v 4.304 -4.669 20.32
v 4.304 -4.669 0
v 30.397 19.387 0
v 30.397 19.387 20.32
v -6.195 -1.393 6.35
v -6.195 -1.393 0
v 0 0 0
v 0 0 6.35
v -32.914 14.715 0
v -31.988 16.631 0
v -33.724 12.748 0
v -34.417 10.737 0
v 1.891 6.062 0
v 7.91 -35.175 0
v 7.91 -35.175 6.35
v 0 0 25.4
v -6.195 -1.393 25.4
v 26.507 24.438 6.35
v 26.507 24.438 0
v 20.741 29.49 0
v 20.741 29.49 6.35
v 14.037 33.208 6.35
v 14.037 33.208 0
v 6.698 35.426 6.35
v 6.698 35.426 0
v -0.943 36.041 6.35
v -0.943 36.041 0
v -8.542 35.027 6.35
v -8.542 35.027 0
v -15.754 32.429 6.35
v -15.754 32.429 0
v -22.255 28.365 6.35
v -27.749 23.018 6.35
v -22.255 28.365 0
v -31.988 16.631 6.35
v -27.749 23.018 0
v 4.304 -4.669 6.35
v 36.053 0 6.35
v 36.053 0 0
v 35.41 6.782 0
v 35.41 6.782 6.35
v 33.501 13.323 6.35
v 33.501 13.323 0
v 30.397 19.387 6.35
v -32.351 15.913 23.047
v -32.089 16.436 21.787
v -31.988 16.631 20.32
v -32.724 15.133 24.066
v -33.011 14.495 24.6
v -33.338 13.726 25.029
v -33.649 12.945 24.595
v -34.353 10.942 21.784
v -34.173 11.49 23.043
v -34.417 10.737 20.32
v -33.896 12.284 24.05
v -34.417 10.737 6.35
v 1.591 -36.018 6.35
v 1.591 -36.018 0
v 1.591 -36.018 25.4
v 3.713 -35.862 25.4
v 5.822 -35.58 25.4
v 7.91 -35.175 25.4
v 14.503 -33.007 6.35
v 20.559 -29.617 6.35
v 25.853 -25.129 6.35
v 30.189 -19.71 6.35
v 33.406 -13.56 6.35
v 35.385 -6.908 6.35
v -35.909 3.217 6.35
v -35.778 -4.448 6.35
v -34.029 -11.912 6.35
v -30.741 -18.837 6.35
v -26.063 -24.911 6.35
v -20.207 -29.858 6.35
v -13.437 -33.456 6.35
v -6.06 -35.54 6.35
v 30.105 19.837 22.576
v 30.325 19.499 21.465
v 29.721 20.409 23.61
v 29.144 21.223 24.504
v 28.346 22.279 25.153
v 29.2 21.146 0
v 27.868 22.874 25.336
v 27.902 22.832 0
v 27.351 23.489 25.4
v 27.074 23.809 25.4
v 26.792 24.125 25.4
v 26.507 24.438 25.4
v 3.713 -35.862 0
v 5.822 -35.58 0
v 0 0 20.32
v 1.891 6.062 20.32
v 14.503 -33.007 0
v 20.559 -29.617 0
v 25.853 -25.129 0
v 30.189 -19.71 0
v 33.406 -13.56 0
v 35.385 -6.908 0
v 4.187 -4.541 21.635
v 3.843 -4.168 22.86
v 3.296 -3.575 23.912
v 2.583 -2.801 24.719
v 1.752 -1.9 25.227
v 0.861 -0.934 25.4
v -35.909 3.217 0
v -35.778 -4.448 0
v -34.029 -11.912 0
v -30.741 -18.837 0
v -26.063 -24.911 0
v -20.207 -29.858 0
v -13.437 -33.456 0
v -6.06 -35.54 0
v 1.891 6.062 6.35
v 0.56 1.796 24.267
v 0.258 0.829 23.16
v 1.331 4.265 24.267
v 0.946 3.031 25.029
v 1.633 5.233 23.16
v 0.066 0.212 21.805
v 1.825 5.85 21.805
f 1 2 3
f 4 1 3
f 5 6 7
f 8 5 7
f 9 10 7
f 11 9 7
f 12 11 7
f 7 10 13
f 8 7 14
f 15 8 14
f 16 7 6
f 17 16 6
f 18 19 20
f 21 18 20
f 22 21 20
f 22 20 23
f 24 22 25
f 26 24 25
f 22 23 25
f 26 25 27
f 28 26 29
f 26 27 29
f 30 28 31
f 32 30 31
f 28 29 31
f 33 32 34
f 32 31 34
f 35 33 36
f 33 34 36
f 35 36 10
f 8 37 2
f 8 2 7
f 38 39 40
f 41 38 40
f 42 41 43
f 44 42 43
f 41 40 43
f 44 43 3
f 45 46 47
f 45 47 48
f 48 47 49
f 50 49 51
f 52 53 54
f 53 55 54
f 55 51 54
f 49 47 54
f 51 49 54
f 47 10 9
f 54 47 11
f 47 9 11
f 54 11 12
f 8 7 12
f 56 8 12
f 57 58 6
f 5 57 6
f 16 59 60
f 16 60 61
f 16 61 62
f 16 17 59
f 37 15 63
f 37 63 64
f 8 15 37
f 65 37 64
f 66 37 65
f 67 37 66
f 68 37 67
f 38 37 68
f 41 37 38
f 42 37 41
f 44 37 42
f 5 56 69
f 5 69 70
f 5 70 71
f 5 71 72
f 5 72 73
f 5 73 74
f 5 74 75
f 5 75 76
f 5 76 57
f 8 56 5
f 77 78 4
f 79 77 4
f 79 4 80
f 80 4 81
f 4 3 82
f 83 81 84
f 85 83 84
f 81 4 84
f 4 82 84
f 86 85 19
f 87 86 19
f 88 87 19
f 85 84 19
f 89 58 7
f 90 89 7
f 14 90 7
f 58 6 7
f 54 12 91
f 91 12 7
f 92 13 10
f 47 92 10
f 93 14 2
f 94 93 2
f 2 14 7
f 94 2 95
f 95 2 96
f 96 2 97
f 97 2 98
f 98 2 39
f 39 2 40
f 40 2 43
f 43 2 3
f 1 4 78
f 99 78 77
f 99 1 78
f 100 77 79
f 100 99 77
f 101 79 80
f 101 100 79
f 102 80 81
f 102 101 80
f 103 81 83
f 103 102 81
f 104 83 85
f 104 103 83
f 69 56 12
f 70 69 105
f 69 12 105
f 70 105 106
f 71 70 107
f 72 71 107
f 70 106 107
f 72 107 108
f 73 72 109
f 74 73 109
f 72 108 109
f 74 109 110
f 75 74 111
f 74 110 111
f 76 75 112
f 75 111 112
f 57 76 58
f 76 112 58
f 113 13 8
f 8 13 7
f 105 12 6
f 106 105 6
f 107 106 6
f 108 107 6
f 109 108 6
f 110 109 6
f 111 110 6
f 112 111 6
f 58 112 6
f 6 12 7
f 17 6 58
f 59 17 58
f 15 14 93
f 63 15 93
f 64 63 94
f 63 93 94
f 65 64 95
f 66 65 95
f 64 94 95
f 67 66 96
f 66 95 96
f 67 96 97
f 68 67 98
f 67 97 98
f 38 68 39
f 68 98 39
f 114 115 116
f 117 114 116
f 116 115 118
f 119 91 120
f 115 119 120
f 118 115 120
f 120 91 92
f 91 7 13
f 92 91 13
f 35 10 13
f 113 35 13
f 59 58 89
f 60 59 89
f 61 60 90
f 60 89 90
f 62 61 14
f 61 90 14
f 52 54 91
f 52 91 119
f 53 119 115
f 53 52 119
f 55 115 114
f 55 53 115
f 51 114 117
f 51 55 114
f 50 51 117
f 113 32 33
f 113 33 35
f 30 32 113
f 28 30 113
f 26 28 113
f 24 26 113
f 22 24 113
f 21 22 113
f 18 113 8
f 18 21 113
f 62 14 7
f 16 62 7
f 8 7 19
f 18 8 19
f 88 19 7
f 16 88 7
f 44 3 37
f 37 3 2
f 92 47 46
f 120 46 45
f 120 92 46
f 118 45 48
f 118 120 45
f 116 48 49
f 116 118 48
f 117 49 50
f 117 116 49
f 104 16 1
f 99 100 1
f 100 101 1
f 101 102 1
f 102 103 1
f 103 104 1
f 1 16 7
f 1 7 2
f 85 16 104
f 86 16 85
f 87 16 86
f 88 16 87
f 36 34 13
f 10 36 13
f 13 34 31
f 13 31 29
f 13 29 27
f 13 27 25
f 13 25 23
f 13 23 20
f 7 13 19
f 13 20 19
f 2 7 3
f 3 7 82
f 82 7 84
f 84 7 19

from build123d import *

# Parameters (mm, degrees)
F1_DEPTH      = 25.4
F2_DEPTH      = 6.35
F3_T1_DEPTH   = 61.4532364119
F3_T3_DEPTH   = 60.8896232126
F3_2_T1_DEPTH = 60.8896232126


# Not quite as in the source:
# - a fillet or chamfer that OpenCascade refuses, or shapes differently, is made with other operations: its cross-section is extruded or revolved along the edge and cut away or added


with BuildPart() as f1:
    # F0 (on Top) → F1 (new body)
    with BuildSketch(Plane.XY):
        with BuildLine():
            Line((-34.4173737851, 10.7368634857), (0, 0))
            Line((0, 0), (1.891066931, 6.0618780805))
            Line((1.891066931, 6.0618780805), (-31.9882667756, 16.6308942775))
            ThreePointArc((-31.9882667756, 16.6308942775), (-33.3333492813, 13.737673801), (-34.4173737851, 10.7368634857))
        make_face()
    extrude(amount=F1_DEPTH)

    # F3: fillet of radius 5.08 on 2 edges, made by hand

    # F3_s2 → F3_t1 (cut)
    with BuildSketch(Plane(origin=(-46.541129946, 14.5189973478, 0), x_dir=(0, 0, 1), z_dir=(0.9546264694, -0.2978058159, 0))):
        with BuildLine():
            ThreePointArc((20.32, 0), (23.9121024484, -1.4878975516), (25.4, -5.08))
            Line((25.4, -5.08), (25.4, 0))
            Line((25.4, 0), (20.32, 0))
        make_face()
    extrude(amount=F3_T1_DEPTH, mode=Mode.SUBTRACT)

    # F3_s4 → F3_t3 (cut)
    with BuildSketch(Plane(origin=(12.1237561609, -3.782133862, 0), x_dir=(0, 0, 1), z_dir=(-0.9546264694, 0.2978058159, 0))):
        with BuildLine():
            ThreePointArc((20.32, 6.35), (23.9121024484, 4.8621024484), (25.4, 1.27))
            Line((25.4, 1.27), (25.4, 6.35))
            Line((25.4, 6.35), (20.32, 6.35))
        make_face()
    extrude(amount=F3_T3_DEPTH, mode=Mode.SUBTRACT)


with BuildPart() as f1b:
    # F0 (on Top) → F1, piece 2 (new body)
    with BuildSketch(Plane.XY):
        with BuildLine():
            ThreePointArc((1.5913564558, -36.0180987894), (4.7695001401, -35.7363641714), (7.9102903569, -35.1747517723))
            Line((7.9102903569, -35.1747517723), (0, 0))
            Line((0, 0), (-6.1952738778, -1.3932270377))
            Line((-6.1952738778, -1.3932270377), (1.5913564558, -36.0180987894))
        make_face()
    extrude(amount=F1_DEPTH)


with BuildPart() as f1c:
    # F0 (on Top) → F1, piece 3 (new body)
    with BuildSketch(Plane.XY):
        with BuildLine():
            Line((4.3042069468, -4.6686510427), (30.3969103198, 19.3872045119))
            ThreePointArc((30.3969103198, 19.3872045119), (28.5638491413, 21.9986903703), (26.5070834282, 24.4378882866))
            Line((26.5070834282, 24.4378882866), (0, 0))
            Line((0, 0), (4.3042069468, -4.6686510427))
        make_face()
    extrude(amount=F1_DEPTH)

    # F3#2: fillet of radius 5.08 on 1 edges, made by hand

    # F3_2_s2 → F3_2_t1 (cut)
    with BuildSketch(Plane(origin=(-9.3373020855, -8.6084138936, 0), x_dir=(0, 0, 1), z_dir=(0.7352206367, 0.6778278656, 0))):
        with BuildLine():
            ThreePointArc((20.32, 6.35), (23.9121024484, 4.8621024484), (25.4, 1.27))
            Line((25.4, 1.27), (25.4, 6.35))
            Line((25.4, 6.35), (20.32, 6.35))
        make_face()
    extrude(amount=F3_2_T1_DEPTH, mode=Mode.SUBTRACT)


with BuildPart() as f2:
    # F0 (on Top) → F2 (new body)
    with BuildSketch(Plane.XY):
        with BuildLine():
            ThreePointArc((-34.4173737851, 10.7368634857), (-28.5638491413, -21.9986903703), (1.5913564558, -36.0180987894))
            Line((1.5913564558, -36.0180987894), (-6.1952738778, -1.3932270377))
            Line((-6.1952738778, -1.3932270377), (0, 0))
            Line((0, 0), (-34.4173737851, 10.7368634857))
        make_face()
    extrude(amount=F2_DEPTH)


with BuildPart() as f2b:
    # F0 (on Top) → F2, piece 2 (new body)
    with BuildSketch(Plane.XY):
        with BuildLine():
            ThreePointArc((7.9102903569, -35.1747517723), (28.1516200608, -22.523812815), (36.0532364119, 0))
            ThreePointArc((36.0532364119, 0), (34.6102791792, 10.0977438526), (30.3969103198, 19.3872045119))
            Line((30.3969103198, 19.3872045119), (4.3042069468, -4.6686510427))
            Line((4.3042069468, -4.6686510427), (0, 0))
            Line((0, 0), (7.9102903569, -35.1747517723))
        make_face()
    extrude(amount=F2_DEPTH)


with BuildPart() as f2c:
    # F0 (on Top) → F2, piece 3 (new body)
    with BuildSketch(Plane.XY):
        with BuildLine():
            Line((0, 0), (26.5070834282, 24.4378882866))
            ThreePointArc((26.5070834282, 24.4378882866), (-4.7695001401, 35.7363641714), (-31.9882667756, 16.6308942775))
            Line((-31.9882667756, 16.6308942775), (1.891066931, 6.0618780805))
            Line((1.891066931, 6.0618780805), (0, 0))
        make_face()
    extrude(amount=F2_DEPTH)


solid = Compound([f1.part, f1b.part, f1c.part, f2.part, f2b.part, f2c.part])
